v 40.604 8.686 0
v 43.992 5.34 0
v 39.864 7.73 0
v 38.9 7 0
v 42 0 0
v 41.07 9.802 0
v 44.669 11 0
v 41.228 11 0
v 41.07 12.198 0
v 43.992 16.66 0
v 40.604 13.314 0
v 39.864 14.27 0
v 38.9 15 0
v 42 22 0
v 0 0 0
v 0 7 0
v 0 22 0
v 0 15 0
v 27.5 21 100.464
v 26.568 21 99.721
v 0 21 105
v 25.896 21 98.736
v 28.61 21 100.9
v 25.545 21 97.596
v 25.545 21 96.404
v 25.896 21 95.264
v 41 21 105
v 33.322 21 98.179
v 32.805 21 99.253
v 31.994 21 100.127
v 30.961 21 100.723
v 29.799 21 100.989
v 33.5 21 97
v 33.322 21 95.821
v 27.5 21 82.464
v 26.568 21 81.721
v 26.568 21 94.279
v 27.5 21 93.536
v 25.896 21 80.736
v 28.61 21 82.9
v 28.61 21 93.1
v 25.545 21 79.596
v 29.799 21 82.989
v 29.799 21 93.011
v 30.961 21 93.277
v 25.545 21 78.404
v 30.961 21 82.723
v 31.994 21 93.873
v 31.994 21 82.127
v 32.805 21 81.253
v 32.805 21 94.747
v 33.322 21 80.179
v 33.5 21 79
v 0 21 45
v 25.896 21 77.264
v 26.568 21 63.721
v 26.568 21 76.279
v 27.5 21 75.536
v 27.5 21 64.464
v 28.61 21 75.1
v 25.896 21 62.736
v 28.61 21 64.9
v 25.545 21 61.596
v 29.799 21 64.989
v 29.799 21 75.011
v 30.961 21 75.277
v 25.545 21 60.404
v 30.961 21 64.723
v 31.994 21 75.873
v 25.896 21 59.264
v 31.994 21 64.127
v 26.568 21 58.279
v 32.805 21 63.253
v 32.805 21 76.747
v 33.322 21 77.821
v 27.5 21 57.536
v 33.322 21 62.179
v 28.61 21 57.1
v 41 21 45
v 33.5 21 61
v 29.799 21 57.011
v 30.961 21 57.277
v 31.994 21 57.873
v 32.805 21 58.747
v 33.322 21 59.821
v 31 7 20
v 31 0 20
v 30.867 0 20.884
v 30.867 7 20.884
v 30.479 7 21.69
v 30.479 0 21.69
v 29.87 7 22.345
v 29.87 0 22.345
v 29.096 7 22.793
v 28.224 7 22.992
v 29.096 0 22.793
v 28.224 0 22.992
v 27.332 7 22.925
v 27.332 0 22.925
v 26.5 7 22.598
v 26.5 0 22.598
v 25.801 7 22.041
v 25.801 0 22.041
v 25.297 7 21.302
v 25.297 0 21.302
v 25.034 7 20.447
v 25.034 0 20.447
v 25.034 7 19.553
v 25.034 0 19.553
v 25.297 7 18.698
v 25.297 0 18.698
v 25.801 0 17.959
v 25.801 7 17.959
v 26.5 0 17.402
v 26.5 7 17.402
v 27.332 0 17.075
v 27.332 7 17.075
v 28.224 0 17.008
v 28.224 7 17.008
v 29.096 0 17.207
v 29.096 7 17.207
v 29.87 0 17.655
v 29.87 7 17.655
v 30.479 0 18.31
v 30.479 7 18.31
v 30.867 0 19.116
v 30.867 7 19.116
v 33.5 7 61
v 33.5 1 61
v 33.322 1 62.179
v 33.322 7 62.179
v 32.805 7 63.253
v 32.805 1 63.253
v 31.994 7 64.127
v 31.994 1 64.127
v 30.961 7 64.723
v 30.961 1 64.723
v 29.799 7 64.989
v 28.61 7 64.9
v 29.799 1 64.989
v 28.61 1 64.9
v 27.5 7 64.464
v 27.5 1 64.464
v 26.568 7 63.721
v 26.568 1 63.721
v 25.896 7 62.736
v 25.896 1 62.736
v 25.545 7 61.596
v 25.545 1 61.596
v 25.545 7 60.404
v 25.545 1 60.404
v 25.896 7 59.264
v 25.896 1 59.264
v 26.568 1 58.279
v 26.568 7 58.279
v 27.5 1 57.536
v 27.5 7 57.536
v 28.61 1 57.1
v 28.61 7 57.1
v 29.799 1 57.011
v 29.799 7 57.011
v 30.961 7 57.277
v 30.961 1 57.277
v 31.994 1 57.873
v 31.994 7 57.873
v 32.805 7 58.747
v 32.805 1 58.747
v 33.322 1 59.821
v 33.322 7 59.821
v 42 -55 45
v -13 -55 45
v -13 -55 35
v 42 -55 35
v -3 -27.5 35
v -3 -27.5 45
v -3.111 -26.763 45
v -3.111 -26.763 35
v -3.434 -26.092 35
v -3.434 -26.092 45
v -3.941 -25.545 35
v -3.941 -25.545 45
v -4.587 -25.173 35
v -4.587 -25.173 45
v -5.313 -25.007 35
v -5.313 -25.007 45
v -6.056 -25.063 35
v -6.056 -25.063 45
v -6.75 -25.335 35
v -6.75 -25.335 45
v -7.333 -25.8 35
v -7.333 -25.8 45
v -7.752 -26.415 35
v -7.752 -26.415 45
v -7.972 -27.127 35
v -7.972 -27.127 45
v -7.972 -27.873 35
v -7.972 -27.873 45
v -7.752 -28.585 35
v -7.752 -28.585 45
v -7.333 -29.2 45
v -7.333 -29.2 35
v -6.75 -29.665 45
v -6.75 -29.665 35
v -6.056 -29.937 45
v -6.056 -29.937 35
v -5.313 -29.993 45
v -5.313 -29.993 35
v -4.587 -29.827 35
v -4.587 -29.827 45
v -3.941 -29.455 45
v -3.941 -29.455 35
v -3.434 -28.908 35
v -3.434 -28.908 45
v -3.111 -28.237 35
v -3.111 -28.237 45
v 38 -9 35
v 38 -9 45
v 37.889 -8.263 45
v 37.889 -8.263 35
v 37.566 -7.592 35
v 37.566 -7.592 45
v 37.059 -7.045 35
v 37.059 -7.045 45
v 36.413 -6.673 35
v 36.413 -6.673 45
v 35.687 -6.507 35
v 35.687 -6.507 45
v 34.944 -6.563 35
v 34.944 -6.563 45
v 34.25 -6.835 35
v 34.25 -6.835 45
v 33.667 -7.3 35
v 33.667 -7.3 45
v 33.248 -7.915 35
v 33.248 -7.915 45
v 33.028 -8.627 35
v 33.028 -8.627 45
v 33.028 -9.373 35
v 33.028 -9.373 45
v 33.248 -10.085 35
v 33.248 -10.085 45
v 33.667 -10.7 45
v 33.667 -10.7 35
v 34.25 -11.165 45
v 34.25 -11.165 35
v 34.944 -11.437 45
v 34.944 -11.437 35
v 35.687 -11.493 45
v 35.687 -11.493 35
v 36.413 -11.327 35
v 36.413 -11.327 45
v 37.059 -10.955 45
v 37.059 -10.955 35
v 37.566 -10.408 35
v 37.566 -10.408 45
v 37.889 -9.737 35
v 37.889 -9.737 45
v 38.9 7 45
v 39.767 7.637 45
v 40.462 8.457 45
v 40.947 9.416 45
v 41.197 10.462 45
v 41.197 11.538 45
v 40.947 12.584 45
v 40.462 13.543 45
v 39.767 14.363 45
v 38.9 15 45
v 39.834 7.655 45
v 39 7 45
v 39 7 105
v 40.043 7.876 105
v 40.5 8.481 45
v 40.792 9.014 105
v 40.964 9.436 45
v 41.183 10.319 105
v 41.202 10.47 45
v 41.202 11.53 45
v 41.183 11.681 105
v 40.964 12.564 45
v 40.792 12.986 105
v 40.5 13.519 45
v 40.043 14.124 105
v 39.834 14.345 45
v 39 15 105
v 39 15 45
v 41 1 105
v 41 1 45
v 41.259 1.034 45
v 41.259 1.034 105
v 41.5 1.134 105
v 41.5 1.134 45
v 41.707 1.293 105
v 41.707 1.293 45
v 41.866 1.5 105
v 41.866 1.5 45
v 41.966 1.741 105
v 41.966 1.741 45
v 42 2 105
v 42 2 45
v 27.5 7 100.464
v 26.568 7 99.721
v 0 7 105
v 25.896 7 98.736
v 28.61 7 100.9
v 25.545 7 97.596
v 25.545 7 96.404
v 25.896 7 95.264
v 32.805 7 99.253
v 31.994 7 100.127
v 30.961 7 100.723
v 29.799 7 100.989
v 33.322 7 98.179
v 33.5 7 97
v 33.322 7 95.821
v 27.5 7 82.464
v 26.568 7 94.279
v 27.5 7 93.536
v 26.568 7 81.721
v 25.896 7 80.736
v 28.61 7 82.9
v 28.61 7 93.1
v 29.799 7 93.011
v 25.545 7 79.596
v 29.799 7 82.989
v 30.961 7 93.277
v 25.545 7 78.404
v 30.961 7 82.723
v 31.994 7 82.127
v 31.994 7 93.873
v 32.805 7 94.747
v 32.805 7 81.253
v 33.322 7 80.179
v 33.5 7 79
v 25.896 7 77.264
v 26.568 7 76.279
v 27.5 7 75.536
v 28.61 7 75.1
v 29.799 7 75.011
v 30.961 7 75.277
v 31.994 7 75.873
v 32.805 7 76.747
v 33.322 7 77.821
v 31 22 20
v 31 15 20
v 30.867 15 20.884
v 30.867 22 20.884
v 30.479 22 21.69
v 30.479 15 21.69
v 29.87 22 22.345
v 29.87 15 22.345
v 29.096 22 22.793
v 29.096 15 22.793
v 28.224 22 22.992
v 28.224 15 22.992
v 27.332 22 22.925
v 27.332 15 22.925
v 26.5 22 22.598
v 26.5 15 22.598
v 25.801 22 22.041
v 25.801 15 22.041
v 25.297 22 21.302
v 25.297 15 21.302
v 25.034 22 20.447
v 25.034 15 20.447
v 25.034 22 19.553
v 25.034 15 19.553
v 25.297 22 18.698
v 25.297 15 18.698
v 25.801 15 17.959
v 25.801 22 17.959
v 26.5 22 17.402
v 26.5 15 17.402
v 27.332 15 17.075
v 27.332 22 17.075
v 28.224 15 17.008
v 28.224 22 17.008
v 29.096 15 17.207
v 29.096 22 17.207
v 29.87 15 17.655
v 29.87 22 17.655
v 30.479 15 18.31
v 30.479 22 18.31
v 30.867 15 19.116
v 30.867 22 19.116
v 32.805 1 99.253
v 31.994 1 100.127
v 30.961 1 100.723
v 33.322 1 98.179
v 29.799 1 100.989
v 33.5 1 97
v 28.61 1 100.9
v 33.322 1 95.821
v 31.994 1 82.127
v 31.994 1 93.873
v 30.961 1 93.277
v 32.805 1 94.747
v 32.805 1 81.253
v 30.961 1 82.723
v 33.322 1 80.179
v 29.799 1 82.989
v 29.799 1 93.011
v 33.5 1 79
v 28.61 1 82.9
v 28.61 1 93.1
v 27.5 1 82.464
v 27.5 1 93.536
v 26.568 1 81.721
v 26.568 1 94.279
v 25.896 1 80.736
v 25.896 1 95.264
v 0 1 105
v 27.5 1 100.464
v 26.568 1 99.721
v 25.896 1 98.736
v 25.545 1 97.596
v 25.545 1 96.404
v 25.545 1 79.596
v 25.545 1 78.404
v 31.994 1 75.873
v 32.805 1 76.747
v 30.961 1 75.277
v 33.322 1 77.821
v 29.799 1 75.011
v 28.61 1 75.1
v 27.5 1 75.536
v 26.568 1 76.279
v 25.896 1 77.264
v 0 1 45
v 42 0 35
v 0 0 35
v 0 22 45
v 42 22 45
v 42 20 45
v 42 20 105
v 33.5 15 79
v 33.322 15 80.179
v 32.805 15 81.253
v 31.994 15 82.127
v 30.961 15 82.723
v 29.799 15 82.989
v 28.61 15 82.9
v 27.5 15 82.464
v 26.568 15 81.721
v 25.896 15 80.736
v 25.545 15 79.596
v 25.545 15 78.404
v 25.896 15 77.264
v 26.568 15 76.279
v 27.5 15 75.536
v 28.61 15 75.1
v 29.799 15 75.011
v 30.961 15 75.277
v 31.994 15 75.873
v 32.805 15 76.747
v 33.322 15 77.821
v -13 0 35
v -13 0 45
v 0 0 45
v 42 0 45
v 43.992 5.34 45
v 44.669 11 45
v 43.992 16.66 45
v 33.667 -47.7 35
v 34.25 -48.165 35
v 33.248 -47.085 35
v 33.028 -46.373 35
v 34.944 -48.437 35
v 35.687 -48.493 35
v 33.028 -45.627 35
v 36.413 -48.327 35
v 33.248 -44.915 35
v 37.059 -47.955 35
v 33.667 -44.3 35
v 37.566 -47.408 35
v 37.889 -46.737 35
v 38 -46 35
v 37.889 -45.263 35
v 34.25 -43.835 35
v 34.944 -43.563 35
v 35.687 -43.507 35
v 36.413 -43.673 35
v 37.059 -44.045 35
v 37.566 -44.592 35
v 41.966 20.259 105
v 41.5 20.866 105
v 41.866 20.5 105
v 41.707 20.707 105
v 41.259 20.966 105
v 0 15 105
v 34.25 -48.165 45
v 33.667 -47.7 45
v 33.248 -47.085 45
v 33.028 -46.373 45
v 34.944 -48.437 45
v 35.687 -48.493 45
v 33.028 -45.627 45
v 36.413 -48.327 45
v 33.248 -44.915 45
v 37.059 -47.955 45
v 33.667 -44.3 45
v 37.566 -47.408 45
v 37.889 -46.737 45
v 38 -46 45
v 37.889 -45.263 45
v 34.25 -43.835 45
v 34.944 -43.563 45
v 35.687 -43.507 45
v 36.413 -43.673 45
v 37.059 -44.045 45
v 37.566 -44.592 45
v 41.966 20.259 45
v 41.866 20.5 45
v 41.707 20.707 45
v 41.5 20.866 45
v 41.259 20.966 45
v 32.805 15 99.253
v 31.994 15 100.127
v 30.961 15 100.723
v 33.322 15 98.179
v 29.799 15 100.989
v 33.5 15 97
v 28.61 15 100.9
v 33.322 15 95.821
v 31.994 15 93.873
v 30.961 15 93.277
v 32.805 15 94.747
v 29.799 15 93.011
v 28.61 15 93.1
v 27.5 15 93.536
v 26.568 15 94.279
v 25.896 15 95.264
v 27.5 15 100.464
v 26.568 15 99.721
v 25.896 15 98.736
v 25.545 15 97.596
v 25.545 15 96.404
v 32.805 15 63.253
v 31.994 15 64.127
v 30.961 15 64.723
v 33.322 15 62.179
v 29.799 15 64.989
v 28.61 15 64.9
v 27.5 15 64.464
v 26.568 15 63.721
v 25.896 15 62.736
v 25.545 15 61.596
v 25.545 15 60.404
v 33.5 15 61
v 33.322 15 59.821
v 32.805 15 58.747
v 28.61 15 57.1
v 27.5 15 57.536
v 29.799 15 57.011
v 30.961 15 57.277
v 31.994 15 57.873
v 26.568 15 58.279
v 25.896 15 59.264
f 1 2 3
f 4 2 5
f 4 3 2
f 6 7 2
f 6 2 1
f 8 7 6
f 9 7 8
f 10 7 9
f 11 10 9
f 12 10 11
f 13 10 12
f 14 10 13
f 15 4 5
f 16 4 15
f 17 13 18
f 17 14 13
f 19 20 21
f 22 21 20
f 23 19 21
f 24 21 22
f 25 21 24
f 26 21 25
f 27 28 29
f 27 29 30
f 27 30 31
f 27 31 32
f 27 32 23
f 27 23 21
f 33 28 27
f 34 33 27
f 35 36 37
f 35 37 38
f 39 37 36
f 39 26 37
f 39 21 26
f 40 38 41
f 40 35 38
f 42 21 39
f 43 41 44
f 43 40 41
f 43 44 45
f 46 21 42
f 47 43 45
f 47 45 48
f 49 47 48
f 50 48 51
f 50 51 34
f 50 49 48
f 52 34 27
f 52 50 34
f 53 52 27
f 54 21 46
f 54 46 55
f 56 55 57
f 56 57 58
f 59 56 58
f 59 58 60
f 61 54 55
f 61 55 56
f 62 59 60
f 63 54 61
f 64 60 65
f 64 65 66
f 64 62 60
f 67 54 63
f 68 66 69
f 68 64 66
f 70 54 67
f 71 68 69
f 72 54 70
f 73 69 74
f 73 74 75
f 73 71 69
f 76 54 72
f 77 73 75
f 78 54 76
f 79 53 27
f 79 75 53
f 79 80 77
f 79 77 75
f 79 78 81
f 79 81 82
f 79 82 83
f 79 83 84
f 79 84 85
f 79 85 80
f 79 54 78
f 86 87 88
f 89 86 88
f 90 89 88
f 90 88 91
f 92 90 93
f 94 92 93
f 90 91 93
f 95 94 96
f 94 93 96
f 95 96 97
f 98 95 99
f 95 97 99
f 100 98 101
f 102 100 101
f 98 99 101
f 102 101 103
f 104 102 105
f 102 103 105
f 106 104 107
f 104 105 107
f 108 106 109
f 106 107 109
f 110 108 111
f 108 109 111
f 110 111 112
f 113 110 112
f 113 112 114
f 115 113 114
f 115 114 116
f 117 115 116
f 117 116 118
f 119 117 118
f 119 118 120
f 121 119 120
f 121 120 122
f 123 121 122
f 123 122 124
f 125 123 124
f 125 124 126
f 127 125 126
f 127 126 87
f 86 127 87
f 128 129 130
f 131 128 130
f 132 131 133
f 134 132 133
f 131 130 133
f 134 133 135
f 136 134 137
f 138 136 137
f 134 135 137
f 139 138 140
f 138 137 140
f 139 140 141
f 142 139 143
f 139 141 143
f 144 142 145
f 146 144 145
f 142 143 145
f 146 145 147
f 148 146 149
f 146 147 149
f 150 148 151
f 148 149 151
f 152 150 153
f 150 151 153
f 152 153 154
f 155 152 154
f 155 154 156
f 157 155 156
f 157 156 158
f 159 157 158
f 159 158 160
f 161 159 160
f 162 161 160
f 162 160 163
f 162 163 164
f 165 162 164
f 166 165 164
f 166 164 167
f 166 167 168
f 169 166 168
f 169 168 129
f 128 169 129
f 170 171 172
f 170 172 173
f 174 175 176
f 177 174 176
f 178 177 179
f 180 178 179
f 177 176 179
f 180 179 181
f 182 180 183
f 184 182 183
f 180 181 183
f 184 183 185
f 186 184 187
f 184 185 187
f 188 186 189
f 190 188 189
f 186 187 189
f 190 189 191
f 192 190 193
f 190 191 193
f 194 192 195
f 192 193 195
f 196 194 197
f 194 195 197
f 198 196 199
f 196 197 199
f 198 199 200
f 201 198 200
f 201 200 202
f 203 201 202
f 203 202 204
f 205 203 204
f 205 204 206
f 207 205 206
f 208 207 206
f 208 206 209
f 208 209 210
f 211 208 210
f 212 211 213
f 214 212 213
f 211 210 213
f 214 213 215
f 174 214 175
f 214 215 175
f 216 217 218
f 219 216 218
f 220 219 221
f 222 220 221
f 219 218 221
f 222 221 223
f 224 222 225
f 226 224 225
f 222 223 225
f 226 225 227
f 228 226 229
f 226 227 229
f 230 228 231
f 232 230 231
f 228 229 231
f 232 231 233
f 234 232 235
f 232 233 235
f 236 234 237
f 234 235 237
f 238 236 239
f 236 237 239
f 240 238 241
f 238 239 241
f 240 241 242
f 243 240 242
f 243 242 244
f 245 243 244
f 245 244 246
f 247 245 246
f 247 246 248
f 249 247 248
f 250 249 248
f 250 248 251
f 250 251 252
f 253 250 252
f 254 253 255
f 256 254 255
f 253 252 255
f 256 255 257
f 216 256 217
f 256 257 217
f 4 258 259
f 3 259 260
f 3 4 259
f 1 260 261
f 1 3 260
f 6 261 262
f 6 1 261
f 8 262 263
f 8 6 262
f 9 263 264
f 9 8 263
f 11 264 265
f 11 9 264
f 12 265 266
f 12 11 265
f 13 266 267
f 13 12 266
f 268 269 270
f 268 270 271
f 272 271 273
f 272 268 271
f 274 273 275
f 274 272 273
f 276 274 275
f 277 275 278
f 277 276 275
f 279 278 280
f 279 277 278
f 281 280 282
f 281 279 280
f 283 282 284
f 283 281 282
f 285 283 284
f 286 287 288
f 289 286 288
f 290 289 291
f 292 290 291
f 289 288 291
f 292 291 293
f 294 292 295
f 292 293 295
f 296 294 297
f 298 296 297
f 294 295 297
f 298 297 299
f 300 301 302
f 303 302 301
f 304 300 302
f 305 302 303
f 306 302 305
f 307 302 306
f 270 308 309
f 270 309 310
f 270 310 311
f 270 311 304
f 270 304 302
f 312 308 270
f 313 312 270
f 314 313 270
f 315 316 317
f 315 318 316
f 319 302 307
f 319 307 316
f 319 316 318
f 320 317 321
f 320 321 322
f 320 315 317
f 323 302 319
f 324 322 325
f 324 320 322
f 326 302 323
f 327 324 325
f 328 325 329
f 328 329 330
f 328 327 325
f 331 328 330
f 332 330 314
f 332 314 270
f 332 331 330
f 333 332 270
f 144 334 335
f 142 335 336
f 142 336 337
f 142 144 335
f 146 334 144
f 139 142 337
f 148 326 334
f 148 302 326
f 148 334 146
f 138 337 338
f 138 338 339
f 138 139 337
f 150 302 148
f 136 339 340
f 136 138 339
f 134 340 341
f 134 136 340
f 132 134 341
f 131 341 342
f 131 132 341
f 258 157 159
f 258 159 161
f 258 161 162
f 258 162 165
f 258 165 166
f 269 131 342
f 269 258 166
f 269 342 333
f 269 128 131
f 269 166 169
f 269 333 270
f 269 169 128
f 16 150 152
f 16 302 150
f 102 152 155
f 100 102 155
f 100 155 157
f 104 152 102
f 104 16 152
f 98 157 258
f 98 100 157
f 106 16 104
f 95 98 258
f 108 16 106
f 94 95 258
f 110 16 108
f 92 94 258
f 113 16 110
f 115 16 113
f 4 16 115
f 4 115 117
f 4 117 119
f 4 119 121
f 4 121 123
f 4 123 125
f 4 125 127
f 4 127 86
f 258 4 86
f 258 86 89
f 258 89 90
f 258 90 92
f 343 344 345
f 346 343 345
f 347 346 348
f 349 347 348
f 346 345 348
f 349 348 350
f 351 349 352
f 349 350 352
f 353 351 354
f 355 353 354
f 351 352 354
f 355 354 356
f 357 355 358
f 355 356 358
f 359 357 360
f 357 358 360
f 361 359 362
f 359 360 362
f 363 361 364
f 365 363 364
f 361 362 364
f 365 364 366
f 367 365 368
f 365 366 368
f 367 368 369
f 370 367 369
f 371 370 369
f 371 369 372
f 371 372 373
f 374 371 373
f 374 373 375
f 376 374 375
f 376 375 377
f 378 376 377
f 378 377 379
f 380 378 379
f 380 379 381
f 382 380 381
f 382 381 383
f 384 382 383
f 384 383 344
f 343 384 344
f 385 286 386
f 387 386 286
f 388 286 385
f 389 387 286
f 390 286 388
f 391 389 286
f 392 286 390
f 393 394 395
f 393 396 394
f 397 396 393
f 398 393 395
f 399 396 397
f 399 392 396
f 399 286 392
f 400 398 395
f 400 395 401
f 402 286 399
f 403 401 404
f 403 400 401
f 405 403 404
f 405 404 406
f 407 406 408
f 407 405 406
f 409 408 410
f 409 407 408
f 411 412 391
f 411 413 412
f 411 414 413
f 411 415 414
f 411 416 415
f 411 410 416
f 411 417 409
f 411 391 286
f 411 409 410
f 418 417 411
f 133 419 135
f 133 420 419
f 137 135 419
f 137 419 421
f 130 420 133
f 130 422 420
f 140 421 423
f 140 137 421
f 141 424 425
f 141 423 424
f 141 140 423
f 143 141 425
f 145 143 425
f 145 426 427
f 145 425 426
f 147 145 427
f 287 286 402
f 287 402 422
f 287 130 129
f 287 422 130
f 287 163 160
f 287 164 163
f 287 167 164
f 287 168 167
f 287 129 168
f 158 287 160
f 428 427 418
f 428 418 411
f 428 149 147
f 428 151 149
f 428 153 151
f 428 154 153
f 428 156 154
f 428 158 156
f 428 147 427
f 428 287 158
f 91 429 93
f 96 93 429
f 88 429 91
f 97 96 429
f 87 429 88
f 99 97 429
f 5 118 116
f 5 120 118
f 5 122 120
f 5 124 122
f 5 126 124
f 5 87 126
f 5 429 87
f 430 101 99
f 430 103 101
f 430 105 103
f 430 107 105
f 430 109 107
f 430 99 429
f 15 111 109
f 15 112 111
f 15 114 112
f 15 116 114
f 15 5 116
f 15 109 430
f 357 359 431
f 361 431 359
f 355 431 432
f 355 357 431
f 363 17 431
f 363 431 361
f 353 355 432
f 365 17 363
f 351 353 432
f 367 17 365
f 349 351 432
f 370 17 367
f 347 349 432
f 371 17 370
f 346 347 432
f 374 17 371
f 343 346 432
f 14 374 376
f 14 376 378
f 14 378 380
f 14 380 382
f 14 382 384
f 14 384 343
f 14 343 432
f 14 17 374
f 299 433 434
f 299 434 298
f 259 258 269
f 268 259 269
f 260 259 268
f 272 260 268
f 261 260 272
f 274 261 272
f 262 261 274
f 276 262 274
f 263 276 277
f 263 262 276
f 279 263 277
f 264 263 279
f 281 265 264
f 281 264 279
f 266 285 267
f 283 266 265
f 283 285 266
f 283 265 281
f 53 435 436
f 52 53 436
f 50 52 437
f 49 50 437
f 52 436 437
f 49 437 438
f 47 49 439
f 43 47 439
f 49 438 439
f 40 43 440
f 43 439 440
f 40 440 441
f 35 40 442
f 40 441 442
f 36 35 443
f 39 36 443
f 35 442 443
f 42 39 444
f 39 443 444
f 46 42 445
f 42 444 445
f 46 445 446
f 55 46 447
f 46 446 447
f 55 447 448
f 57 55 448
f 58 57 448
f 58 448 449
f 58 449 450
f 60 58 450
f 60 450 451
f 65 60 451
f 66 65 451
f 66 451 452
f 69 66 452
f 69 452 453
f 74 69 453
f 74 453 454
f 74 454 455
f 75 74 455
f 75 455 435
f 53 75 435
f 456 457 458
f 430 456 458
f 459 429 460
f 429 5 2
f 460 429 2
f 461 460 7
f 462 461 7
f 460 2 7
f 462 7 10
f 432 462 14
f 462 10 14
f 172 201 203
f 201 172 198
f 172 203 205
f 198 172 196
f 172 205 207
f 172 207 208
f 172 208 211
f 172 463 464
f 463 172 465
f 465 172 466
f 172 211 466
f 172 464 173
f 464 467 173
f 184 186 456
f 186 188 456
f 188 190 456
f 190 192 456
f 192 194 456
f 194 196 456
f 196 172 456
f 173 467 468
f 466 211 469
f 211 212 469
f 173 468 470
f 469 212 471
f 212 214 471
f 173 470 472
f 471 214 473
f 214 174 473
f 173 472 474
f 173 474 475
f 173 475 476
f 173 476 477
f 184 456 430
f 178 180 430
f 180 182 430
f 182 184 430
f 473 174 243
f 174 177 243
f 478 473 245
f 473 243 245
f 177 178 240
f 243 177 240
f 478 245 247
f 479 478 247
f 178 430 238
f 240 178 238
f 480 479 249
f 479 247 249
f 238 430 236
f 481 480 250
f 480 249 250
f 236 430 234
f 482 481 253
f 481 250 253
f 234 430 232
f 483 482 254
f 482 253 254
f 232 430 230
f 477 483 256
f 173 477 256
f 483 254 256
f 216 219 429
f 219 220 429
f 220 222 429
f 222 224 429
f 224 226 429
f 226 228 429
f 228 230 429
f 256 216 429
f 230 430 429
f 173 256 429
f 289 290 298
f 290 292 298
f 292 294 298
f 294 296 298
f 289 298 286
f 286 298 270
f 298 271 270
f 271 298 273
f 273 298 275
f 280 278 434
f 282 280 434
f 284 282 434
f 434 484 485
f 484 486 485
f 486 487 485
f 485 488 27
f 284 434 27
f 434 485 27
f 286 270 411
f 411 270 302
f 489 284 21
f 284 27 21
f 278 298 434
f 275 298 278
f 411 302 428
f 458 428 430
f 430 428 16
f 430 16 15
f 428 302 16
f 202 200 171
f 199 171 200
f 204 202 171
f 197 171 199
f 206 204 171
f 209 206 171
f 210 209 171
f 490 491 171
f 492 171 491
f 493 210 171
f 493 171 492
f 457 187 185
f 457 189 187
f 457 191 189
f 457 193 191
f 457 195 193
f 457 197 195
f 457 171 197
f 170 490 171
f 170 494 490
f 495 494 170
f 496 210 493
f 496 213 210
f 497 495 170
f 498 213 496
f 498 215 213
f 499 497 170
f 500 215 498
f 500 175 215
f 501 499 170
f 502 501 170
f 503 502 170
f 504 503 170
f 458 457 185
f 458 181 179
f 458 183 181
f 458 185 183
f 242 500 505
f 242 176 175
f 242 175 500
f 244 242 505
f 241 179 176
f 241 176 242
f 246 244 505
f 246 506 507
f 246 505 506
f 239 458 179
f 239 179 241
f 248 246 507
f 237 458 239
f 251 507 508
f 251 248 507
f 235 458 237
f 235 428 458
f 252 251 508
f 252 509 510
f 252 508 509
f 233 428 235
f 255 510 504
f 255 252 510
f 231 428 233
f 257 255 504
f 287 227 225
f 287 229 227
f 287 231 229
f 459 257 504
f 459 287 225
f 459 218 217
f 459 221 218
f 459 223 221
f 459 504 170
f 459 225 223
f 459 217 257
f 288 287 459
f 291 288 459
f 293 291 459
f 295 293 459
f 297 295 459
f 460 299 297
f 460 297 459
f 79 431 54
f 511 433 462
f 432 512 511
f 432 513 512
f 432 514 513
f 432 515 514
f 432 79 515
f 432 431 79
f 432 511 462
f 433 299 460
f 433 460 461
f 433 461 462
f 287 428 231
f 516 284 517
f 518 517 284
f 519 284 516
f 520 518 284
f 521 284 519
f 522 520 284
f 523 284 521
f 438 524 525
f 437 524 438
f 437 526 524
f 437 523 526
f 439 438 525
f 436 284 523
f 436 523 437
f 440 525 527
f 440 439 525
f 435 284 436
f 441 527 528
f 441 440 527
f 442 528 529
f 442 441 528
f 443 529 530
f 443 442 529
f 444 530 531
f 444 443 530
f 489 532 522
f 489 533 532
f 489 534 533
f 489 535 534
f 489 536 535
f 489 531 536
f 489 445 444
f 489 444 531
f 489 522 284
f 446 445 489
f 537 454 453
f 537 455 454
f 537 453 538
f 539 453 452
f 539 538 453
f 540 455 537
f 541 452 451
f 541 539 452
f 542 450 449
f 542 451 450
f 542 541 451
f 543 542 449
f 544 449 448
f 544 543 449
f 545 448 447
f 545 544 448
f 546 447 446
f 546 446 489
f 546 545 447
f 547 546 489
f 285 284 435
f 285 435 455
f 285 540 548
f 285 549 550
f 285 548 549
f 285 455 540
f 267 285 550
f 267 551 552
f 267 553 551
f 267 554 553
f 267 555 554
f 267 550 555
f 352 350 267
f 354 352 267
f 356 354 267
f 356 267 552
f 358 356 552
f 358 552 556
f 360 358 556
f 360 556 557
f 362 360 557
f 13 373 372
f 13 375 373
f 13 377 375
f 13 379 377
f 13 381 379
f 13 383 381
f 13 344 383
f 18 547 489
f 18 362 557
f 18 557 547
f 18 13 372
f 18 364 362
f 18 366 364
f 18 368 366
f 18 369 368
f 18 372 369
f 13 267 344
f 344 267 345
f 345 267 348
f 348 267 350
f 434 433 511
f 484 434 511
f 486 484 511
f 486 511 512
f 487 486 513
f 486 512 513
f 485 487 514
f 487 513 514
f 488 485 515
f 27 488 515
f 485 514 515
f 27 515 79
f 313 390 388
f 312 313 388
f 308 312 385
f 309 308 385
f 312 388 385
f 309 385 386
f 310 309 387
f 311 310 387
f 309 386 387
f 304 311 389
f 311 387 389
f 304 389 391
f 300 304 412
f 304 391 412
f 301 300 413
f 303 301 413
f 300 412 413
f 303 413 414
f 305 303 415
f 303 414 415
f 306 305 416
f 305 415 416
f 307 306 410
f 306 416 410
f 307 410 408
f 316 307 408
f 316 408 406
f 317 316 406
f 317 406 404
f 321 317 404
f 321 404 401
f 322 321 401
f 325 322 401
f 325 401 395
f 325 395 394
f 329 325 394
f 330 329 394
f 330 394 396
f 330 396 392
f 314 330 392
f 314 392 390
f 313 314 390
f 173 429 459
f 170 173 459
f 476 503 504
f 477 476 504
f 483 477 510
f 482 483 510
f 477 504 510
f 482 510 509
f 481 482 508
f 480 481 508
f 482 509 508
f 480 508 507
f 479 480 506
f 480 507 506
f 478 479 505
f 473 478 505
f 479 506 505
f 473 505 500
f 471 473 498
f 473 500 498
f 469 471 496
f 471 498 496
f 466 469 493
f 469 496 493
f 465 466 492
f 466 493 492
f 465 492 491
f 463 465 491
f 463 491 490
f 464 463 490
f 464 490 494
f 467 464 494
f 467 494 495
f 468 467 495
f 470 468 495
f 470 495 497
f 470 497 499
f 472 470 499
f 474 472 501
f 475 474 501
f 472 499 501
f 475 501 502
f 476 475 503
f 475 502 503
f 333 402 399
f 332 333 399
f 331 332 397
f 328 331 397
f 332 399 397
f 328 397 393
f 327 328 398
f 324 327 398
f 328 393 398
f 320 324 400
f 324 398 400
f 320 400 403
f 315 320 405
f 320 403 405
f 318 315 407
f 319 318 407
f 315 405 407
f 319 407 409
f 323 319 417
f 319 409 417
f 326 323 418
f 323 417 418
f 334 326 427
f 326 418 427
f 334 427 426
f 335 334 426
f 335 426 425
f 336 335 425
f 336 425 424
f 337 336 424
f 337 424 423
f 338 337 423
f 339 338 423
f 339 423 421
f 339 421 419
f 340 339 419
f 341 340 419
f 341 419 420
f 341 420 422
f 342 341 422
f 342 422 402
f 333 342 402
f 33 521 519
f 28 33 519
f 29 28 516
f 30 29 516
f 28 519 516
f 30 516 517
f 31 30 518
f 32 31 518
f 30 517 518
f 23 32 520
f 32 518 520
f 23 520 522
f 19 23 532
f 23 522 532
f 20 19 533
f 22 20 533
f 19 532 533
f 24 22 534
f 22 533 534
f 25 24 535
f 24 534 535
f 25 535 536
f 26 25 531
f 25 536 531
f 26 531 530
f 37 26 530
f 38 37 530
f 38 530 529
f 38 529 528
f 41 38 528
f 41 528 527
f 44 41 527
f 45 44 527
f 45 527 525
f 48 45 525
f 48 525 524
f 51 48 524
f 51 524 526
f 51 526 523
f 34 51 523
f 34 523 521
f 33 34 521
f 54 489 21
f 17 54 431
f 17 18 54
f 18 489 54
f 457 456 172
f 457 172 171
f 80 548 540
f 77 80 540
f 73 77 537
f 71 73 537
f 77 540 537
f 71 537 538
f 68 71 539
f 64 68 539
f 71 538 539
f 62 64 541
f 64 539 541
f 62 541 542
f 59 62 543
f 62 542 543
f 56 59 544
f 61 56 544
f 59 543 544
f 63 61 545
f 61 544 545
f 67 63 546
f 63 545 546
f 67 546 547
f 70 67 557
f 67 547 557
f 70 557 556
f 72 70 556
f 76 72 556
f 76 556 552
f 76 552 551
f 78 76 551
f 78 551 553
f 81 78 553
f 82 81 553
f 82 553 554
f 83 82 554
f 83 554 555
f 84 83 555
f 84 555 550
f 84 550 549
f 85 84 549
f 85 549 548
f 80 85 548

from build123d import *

# Parameters (mm, degrees)
PAD_DEPTH       = 45
SKETCH001_W     = 55
SKETCH001_H     = 10
PAD001_DEPTH    = 55
SKETCH002_R     = 3
POCKET_DEPTH    = 22
SKETCH003_R     = 2.5
POCKET001_DEPTH = 10
PAD002_DEPTH    = 60
SKETCH005_R     = 4
POCKET002_DEPTH = 20


with BuildPart() as part:
    # Sketch → Pad (new body)
    with BuildSketch(Plane.XY):
        with BuildLine():
            Line((0, 22), (42, 22))
            ThreePointArc((42, 0), (44.669271, 11), (42, 22))
            Line((42, 0), (0, 0))
            Line((0, 7), (0, 0))
            Line((38.9, 7), (0, 7))
            ThreePointArc((38.9, 7), (41.228437, 11), (38.9, 15))
            Line((0, 15), (38.9, 15))
            Line((0, 22), (0, 15))
        make_face()
    extrude(amount=PAD_DEPTH)

    # Sketch001 (on Face4 of Pad) → Pad001 (join)
    with BuildSketch(Plane.XZ):
        with Locations((14.5, 40)):
            Rectangle(SKETCH001_W, SKETCH001_H)
    extrude(amount=PAD001_DEPTH)

    # Sketch002 (on Face8 of Pad001) → Pocket (cut)
    with BuildSketch(Plane.XZ):
        with Locations((28, 20)):
            Circle(SKETCH002_R)
    extrude(amount=-POCKET_DEPTH, mode=Mode.SUBTRACT)

    # Sketch003 (on Face12 of Pocket) → Pocket001 (cut)
    with BuildSketch(Plane.XY.offset(45)):
        with Locations((35.5, -9)):
            Circle(SKETCH003_R)
        with Locations((35.5, -46)):
            Circle(SKETCH003_R)
        with Locations((-5.5, -27.5)):
            Circle(SKETCH003_R)
    extrude(amount=-POCKET001_DEPTH, mode=Mode.SUBTRACT)

    # Sketch004 (on Face5 of Pocket001) → Pad002 (join)
    with BuildSketch(Plane.XY.offset(45)):
        with BuildLine():
            Line((0, 21), (41, 21))
            ThreePointArc((42, 20), (41.707107, 20.707107), (41, 21))
            Line((42, 20), (42, 2))
            ThreePointArc((41, 1), (41.707107, 1.292893), (42, 2))
            Line((41, 1), (0, 1))
            Line((0, 1), (0, 7))
            Line((0, 7), (39, 7))
            ThreePointArc((39, 7), (41.232207, 11), (39, 15))
            Line((39, 15), (0, 15))
            Line((0, 15), (0, 21))
        make_face()
    extrude(amount=PAD002_DEPTH)

    # Sketch005 → Pocket002 (cut)
    with BuildSketch(Plane.XZ.offset(-1)):
        with Locations((29.5, 61)):
            Circle(SKETCH005_R)
        with Locations((29.5, 79)):
            Circle(SKETCH005_R)
        with Locations((29.5, 97)):
            Circle(SKETCH005_R)
    extrude(amount=-POCKET002_DEPTH, mode=Mode.SUBTRACT)


solid = part.part
